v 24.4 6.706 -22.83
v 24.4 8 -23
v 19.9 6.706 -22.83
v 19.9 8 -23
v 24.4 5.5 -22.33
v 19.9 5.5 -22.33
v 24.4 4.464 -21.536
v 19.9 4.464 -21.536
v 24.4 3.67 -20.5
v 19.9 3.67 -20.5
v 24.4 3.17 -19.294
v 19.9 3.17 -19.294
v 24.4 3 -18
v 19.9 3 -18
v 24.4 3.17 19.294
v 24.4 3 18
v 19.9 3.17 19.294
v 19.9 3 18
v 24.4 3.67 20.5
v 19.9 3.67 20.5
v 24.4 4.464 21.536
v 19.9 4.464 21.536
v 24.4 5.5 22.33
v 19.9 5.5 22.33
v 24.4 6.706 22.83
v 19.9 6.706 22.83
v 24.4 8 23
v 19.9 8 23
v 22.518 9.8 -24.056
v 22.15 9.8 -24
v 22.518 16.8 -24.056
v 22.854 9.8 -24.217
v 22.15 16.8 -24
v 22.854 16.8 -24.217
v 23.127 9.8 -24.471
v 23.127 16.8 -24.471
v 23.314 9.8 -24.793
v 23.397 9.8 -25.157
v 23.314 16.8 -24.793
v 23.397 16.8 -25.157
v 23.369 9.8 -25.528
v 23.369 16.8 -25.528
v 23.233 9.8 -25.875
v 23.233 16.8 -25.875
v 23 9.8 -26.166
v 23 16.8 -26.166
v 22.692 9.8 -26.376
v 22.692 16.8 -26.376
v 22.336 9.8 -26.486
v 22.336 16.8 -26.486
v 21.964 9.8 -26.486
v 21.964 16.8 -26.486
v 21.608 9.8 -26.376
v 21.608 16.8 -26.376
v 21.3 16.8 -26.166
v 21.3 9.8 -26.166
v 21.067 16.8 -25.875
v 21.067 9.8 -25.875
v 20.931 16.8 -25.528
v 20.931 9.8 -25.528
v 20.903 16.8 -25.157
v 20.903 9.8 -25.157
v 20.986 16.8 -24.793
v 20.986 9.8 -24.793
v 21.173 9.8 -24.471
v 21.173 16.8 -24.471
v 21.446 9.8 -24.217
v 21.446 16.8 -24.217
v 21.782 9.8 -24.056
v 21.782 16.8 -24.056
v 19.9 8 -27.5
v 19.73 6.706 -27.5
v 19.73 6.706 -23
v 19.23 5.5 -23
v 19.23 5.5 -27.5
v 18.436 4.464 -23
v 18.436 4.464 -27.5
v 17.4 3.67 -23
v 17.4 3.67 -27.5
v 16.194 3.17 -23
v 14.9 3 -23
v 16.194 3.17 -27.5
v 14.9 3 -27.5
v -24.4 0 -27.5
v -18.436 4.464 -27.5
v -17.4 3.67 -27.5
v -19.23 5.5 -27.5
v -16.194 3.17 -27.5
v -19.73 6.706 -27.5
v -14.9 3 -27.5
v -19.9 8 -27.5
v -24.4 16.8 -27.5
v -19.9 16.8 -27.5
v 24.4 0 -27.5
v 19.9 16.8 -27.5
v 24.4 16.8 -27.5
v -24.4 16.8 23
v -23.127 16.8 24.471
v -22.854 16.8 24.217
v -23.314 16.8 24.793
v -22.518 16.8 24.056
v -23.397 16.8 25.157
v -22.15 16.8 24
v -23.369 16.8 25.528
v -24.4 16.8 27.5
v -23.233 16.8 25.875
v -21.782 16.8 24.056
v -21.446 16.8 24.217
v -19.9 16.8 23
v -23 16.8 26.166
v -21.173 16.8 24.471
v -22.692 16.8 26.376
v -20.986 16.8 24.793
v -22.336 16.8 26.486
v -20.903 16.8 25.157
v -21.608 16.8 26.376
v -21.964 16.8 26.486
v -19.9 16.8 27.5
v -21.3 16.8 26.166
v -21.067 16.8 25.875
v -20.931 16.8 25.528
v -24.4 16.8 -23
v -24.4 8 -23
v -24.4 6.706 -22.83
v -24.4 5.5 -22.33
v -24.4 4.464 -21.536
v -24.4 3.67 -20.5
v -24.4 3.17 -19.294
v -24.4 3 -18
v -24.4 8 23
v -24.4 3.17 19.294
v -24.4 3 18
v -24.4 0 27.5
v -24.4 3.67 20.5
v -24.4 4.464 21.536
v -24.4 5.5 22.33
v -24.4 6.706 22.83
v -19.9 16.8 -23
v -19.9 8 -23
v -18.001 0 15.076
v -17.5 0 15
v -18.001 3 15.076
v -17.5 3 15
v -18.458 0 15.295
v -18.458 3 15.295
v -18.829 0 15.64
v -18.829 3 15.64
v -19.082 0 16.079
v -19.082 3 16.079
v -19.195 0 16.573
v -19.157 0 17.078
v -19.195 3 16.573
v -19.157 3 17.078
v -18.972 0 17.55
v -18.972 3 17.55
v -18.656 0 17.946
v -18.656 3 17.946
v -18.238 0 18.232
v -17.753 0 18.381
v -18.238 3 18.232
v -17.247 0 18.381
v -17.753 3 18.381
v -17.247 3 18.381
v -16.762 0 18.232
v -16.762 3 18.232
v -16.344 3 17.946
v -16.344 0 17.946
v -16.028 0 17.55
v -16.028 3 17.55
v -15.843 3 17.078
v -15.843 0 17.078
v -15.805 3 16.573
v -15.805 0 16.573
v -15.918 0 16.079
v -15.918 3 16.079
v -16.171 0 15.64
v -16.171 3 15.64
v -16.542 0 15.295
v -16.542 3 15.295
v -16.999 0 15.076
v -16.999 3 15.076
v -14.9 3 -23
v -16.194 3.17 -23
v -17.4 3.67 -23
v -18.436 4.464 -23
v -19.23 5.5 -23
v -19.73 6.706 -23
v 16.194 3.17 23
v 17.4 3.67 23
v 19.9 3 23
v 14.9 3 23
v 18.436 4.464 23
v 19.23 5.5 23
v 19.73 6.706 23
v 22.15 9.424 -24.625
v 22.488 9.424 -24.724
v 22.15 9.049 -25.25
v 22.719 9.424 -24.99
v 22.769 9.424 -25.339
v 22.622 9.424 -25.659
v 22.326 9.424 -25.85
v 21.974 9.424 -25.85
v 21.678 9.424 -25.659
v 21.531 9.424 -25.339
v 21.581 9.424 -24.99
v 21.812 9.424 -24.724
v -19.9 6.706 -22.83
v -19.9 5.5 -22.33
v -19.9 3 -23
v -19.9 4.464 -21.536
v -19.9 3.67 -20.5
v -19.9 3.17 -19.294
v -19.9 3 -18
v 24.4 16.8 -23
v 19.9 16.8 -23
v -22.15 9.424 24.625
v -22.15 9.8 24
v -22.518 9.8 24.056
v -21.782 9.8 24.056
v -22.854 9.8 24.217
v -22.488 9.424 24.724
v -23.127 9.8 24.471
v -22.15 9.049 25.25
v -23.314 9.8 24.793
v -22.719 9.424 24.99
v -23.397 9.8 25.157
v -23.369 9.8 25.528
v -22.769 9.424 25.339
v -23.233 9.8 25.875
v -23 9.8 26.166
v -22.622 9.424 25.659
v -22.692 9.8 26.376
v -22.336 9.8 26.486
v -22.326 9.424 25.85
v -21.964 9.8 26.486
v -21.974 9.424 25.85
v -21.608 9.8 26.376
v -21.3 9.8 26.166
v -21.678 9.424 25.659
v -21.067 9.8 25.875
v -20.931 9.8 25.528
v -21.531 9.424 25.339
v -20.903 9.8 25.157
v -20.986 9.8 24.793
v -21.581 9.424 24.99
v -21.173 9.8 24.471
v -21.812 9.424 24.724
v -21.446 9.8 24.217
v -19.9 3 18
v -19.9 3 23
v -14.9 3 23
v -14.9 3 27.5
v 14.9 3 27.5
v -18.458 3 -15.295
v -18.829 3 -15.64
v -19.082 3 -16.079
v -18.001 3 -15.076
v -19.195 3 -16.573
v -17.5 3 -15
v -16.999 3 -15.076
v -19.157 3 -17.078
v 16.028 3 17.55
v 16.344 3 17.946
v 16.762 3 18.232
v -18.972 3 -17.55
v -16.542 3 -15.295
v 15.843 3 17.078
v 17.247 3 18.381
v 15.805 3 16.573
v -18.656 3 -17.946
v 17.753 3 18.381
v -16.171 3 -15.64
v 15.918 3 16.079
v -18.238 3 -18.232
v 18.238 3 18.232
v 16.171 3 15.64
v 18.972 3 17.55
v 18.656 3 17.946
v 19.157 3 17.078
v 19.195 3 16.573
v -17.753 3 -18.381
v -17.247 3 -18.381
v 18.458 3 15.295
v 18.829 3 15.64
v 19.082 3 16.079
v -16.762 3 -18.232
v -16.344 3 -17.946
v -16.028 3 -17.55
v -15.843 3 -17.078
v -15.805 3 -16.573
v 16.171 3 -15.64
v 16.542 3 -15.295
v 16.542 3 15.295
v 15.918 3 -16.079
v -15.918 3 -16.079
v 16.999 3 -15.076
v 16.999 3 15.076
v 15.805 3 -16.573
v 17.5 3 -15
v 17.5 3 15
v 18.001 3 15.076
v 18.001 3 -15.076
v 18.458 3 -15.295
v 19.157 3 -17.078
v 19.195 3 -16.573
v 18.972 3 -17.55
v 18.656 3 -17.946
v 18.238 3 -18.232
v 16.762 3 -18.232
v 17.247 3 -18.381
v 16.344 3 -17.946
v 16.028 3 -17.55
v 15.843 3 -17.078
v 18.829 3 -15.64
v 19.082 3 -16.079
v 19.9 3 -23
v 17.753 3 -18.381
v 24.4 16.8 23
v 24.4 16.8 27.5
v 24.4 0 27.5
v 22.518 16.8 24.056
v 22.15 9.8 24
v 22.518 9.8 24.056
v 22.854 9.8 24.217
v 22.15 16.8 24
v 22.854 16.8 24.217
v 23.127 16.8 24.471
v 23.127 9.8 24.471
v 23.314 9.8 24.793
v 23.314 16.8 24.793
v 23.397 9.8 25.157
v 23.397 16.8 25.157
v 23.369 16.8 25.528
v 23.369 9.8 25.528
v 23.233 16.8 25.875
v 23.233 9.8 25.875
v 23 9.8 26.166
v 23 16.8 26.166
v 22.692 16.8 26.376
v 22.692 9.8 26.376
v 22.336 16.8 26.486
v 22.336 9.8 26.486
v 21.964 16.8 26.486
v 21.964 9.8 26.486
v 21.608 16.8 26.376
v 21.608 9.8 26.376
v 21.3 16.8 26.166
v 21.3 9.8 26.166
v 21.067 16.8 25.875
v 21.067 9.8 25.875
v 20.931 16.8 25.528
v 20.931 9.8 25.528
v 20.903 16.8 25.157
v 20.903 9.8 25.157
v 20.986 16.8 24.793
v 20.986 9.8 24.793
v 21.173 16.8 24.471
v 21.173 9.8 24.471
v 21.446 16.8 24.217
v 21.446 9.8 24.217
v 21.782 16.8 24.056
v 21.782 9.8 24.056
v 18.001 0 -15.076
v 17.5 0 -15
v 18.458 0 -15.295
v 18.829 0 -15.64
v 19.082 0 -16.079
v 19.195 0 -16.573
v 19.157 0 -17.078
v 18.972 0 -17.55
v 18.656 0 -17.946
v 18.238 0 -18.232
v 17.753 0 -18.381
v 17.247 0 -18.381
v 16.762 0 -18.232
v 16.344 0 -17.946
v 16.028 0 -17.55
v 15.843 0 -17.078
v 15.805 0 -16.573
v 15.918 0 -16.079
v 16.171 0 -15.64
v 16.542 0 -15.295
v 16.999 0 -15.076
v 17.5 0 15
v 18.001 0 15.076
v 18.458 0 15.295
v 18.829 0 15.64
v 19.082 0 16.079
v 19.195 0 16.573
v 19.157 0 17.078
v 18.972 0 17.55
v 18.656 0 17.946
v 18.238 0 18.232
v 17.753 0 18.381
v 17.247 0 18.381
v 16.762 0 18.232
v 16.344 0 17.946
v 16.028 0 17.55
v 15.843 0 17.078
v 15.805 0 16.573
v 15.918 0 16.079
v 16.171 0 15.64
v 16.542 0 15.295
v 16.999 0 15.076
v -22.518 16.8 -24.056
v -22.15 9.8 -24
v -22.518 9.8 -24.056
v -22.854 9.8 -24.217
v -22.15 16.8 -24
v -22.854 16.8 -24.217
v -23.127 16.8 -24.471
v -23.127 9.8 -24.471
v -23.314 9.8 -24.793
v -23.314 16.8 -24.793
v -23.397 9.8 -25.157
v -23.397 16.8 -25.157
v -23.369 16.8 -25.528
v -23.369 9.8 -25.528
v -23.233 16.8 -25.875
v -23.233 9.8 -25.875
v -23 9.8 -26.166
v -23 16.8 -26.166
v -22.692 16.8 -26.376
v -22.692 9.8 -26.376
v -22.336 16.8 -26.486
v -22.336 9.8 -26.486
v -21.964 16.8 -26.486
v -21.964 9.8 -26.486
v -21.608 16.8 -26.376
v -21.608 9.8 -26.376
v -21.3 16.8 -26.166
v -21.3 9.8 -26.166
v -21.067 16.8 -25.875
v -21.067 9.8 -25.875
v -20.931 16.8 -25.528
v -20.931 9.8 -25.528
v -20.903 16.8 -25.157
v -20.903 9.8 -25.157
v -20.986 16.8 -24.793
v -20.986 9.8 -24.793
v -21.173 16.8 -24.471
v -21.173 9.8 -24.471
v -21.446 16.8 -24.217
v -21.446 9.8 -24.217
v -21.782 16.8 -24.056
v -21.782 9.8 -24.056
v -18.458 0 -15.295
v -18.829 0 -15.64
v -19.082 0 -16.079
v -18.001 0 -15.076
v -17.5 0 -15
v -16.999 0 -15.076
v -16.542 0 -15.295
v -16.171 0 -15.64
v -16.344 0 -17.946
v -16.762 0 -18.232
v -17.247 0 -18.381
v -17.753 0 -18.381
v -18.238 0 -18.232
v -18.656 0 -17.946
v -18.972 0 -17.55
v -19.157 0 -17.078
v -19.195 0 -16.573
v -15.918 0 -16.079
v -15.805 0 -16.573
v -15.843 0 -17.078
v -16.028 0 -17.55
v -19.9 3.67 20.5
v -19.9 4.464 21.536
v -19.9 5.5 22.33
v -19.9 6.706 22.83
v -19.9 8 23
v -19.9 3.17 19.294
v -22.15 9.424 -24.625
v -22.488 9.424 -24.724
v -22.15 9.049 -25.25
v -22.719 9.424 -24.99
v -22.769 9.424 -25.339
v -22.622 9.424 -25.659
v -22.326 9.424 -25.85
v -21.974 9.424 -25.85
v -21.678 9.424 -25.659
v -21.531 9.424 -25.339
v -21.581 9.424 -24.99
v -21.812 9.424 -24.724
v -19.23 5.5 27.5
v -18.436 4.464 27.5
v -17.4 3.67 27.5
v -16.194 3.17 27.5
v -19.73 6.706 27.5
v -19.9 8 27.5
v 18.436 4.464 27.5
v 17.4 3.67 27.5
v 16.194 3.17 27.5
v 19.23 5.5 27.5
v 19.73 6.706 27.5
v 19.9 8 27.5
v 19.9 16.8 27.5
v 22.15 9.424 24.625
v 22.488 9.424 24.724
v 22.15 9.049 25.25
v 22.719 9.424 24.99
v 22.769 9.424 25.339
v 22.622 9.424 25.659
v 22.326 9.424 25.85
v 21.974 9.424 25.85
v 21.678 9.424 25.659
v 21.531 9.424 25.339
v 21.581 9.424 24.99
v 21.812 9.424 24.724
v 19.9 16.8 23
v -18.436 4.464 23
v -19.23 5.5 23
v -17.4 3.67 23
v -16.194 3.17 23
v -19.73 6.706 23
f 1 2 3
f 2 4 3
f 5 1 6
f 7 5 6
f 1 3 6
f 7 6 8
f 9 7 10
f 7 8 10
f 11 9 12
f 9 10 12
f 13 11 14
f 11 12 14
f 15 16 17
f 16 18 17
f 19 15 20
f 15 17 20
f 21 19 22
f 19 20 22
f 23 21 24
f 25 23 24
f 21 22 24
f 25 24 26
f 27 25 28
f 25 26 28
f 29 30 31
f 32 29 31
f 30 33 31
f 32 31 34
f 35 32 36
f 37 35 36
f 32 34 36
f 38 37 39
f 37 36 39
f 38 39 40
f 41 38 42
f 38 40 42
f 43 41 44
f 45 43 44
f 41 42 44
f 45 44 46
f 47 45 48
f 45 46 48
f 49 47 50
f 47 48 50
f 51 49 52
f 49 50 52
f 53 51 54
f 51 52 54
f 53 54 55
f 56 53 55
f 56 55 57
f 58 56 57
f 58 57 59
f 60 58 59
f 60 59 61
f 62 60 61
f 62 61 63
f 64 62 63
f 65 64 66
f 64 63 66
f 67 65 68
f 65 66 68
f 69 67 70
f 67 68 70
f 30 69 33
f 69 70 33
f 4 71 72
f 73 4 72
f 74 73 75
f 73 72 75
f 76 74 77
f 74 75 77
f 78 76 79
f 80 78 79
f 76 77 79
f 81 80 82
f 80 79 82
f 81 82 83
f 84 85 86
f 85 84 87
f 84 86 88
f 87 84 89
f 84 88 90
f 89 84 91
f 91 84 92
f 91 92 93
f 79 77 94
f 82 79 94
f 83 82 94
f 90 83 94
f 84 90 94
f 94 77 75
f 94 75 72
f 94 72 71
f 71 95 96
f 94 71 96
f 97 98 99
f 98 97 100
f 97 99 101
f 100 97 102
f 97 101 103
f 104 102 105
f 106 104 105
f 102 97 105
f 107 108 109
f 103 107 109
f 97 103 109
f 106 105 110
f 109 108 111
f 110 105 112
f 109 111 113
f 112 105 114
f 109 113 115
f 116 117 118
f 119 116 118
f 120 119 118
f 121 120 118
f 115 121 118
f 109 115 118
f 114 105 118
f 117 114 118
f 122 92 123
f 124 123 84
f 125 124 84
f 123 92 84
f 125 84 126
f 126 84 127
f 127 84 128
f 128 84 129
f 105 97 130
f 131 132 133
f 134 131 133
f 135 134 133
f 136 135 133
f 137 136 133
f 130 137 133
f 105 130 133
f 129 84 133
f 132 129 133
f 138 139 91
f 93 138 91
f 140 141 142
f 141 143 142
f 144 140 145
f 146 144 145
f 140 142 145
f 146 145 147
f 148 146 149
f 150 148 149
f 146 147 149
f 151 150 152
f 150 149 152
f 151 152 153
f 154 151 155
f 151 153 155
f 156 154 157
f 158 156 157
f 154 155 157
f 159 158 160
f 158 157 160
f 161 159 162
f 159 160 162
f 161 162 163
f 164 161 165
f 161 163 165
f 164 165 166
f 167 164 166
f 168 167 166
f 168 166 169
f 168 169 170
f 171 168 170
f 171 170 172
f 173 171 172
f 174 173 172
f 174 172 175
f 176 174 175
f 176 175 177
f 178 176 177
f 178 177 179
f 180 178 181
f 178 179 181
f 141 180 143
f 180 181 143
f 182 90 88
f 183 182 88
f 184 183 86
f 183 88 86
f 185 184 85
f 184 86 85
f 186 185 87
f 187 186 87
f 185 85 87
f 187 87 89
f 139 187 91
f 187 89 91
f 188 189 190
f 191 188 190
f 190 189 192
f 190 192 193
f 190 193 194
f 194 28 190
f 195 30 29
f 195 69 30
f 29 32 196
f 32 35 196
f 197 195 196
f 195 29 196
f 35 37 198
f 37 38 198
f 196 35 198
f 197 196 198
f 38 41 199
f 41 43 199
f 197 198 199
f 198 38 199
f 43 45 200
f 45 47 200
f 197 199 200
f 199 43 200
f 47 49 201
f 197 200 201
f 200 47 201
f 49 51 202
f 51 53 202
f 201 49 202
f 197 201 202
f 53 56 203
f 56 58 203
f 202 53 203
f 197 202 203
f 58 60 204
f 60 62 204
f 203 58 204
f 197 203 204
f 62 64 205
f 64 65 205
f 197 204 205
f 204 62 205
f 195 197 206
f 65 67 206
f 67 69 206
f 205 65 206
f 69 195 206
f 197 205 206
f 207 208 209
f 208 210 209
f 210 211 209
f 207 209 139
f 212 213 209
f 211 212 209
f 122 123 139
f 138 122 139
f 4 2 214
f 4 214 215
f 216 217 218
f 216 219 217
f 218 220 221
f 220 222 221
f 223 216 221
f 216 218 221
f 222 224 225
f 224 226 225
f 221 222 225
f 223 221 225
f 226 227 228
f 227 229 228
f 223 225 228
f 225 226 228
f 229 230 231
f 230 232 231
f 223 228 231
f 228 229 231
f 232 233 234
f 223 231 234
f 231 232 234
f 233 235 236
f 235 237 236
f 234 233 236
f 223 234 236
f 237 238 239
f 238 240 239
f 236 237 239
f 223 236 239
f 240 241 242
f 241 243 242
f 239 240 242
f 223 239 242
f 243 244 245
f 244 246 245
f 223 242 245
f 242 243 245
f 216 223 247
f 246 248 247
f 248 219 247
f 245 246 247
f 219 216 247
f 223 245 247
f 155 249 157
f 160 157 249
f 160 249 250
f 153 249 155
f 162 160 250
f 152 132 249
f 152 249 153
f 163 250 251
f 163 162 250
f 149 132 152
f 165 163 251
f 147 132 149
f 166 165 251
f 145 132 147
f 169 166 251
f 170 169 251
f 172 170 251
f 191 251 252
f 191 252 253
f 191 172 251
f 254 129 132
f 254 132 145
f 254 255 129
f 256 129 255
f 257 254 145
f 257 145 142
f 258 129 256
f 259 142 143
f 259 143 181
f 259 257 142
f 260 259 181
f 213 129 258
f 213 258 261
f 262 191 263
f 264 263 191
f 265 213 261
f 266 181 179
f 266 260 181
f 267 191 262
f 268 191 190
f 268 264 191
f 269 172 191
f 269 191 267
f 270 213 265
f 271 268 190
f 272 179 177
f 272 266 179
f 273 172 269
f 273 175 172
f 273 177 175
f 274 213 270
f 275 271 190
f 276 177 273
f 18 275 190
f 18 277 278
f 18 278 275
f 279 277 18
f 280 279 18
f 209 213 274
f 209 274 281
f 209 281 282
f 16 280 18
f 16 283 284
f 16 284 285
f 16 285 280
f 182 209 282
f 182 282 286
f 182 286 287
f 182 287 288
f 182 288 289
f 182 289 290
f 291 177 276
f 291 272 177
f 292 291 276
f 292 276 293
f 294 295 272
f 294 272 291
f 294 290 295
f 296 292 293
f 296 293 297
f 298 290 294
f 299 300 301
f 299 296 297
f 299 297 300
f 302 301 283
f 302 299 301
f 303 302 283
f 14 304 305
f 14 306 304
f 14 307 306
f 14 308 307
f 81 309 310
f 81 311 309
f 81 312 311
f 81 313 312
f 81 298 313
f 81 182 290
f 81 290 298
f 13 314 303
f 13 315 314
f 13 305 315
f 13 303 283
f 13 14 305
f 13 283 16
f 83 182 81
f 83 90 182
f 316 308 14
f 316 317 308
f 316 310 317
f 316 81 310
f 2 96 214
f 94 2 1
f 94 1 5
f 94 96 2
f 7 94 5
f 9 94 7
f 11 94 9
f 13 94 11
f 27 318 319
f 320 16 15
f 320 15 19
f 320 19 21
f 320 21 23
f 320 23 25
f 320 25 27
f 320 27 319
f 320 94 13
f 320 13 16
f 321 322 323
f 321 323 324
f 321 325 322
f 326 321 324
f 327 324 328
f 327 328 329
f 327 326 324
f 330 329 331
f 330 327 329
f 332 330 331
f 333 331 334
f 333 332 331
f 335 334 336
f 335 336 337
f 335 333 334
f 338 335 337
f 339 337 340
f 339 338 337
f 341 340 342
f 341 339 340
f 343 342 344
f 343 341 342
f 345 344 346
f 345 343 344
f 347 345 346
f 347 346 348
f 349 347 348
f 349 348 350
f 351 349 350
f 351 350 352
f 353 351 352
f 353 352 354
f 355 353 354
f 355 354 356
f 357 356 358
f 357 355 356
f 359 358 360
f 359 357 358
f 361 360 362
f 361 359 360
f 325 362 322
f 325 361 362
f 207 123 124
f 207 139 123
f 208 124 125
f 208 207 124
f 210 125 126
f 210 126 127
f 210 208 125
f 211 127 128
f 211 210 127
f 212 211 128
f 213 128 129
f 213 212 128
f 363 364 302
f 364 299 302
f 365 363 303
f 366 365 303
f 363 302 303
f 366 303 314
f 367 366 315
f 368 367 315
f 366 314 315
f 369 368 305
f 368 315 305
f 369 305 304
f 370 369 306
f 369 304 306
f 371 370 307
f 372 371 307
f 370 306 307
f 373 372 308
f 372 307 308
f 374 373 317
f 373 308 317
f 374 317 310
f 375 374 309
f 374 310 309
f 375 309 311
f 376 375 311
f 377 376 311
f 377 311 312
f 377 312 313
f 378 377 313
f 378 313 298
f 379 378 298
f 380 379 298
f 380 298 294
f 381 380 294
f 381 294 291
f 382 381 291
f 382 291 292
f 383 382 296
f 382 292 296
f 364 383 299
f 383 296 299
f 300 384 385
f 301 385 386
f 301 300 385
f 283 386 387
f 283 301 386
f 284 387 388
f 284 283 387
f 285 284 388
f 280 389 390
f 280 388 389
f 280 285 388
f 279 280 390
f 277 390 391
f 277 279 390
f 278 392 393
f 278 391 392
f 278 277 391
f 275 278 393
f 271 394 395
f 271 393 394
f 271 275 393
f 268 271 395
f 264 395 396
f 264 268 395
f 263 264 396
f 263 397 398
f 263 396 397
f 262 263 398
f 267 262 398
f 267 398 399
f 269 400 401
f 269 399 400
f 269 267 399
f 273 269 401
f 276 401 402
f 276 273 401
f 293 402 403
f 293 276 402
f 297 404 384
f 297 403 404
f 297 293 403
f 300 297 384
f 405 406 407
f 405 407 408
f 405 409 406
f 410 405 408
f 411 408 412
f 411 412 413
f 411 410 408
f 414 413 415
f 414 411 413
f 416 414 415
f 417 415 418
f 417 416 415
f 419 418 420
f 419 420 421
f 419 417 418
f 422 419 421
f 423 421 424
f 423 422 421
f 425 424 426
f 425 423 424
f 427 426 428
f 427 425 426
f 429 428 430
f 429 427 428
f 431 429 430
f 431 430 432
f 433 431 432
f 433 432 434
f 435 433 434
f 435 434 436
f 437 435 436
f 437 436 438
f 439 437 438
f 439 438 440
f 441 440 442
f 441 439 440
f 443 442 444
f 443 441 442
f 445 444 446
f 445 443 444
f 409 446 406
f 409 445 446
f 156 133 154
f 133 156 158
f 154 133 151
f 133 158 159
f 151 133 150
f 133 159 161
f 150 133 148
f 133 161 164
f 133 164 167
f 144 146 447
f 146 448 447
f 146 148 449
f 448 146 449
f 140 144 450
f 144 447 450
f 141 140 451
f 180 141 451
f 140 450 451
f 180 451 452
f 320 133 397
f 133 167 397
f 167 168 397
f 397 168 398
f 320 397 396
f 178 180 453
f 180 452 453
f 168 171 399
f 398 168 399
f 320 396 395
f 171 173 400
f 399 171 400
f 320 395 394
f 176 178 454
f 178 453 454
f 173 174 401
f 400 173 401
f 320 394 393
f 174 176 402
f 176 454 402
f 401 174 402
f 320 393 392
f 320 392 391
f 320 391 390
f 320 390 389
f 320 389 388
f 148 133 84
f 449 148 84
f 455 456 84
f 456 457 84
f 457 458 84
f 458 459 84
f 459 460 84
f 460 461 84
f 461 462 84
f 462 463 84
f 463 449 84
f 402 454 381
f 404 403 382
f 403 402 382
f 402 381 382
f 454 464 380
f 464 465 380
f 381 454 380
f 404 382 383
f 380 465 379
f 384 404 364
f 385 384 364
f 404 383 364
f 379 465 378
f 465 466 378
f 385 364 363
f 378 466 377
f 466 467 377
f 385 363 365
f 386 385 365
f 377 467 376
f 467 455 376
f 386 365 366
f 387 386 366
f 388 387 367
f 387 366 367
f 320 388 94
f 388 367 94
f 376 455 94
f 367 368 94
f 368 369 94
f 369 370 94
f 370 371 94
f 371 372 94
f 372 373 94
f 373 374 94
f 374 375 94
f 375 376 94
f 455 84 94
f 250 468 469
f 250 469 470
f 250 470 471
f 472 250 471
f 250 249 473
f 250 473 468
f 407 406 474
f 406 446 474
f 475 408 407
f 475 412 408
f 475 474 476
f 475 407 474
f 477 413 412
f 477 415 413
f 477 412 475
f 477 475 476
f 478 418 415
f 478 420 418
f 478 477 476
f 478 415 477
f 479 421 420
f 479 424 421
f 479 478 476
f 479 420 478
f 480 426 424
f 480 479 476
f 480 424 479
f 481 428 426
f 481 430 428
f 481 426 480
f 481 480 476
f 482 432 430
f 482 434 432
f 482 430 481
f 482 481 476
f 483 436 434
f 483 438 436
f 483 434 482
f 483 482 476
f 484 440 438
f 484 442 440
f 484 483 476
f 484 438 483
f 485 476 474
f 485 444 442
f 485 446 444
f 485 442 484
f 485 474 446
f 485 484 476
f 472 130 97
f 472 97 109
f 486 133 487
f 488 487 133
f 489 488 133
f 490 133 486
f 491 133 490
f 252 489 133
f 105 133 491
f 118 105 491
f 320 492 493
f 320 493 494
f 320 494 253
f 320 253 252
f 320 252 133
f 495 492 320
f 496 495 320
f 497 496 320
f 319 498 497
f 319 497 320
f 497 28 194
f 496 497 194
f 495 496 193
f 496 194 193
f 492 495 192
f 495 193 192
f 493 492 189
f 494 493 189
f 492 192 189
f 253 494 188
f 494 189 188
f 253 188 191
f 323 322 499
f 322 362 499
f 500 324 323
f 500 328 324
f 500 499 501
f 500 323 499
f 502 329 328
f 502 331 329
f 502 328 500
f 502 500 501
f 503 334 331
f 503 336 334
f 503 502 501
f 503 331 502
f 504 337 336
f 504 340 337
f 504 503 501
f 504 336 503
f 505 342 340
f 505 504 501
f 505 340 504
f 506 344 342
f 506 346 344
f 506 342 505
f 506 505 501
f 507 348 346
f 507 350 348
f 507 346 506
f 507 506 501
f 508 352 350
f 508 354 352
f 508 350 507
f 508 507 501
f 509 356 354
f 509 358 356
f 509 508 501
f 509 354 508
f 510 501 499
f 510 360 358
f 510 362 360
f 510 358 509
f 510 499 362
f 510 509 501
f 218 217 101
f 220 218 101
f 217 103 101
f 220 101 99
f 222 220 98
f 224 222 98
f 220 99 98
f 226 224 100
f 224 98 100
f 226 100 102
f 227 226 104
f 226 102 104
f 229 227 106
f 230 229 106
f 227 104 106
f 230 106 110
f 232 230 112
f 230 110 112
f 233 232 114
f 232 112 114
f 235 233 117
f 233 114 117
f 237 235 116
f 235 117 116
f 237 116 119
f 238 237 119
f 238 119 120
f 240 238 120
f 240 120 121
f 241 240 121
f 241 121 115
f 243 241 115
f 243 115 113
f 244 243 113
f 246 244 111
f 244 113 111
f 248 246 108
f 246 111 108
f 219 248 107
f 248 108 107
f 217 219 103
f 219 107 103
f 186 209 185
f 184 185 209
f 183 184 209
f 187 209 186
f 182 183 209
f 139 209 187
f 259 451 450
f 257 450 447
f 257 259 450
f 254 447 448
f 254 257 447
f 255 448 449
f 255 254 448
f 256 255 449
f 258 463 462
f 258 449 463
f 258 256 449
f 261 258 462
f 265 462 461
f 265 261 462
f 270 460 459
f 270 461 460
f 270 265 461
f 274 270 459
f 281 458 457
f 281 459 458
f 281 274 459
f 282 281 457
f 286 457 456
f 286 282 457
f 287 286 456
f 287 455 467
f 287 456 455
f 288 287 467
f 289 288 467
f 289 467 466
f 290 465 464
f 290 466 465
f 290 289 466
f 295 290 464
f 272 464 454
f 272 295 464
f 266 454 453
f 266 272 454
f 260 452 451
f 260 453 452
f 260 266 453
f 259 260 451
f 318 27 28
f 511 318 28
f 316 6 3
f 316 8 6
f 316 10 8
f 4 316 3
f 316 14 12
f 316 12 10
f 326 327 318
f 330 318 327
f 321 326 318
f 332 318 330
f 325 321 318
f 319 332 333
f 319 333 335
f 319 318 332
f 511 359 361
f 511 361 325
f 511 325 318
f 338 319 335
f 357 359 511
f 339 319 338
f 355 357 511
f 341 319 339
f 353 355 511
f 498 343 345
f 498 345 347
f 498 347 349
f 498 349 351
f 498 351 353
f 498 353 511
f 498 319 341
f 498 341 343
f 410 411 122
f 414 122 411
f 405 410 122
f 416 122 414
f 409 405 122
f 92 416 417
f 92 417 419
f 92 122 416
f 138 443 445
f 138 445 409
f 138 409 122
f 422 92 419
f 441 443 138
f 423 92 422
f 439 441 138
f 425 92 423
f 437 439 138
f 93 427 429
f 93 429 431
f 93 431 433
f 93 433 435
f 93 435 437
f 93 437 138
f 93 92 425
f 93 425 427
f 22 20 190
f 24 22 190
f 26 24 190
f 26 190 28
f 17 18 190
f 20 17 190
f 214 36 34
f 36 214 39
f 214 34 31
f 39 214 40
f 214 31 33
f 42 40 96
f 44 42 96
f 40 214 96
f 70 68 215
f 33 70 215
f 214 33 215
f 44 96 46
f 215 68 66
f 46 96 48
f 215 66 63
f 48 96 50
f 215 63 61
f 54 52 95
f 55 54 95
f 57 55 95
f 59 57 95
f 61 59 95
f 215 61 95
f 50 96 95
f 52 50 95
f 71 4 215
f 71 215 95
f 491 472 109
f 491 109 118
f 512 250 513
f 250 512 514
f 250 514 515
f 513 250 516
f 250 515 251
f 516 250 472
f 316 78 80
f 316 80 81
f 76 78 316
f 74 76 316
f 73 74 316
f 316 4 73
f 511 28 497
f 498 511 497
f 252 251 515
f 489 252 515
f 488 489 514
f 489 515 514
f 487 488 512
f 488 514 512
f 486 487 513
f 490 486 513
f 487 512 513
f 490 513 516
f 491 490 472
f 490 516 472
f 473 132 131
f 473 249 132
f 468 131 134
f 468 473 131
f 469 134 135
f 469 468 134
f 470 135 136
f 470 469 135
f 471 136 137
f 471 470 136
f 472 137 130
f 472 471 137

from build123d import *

# Parameters (mm, degrees)
SKETCH1_W               = 48.8
SKETCH1_H               = 55
BOSS_EXTRUDE1_DEPTH     = 3
SKETCH2_W               = 4.5
SKETCH2_H               = 4.5
BOSS_EXTRUDE2_DEPTH     = 13.8
FILLET1_R               = 5
FILLET2_START           = -27.5
FILLET2_DEPTH           = 4.5
MIRROR4_COPY_1_SKETCH_W = 4.5
MIRROR4_COPY_1_SKETCH_H = 4.5
MIRROR4_COPY_1_DEPTH    = 13.8
FILLET3_R               = 5
FILLET4_START           = -27.5
FILLET4_DEPTH           = 4.5
FILLET5_R               = 5
FILLET6_START           = 23
FILLET6_DEPTH           = 4.5
FILLET7_R               = 5
FILLET8_START           = 23
FILLET8_DEPTH           = 4.5


with BuildPart() as part:
    # Sketch1 → Boss-Extrude1 (new body)
    with BuildSketch(Plane(origin=(0, 0, 0), x_dir=(1, 0, 0), z_dir=(0, 1, 0))):
        Rectangle(SKETCH1_W, SKETCH1_H)
    extrude(amount=BOSS_EXTRUDE1_DEPTH)

    # Sketch2 → Boss-Extrude2 (add)
    with BuildSketch(Plane(origin=(0, 3, 0), x_dir=(1, 0, 0), z_dir=(0, 1, 0))):
        with Locations((-22.15, 25.25)):
            Rectangle(SKETCH2_W, SKETCH2_H)
    boss_extrude2 = extrude(amount=BOSS_EXTRUDE2_DEPTH)

    # Sketch11 → M3x0.5 Tapped Hole1 (revolve, cut)
    with BuildSketch(Plane(origin=(-22.15, 16.8, -25.25), x_dir=(0, 0, 1), z_dir=(1, 0, 0))):
        Polygon((0, 0), (0, 7.751075774), (1.25, 7), (1.25, 0), align=None)
    m3x0_5_tapped_hole1 = revolve(axis=Axis((-22.15, 23.15, -25.25), (0, -1, 0)), mode=Mode.SUBTRACT)

    # Sketch13 → M3 Clearance Hole1 (revolve, cut)
    with BuildSketch(Plane(origin=(-17.5, 3, -16.7), x_dir=(0, 0, 1), z_dir=(1, 0, 0))):
        Polygon((0, 0), (0, 9.521463052), (1.7, 8.5), (1.7, 0), align=None)
    m3_clearance_hole1 = revolve(axis=Axis((-17.5, 9.35, -16.7), (0, -1, 0)), mode=Mode.SUBTRACT)

    # Fillet1
    fillet1_edges = [part.edges().sort_by_distance(p)[0] for p in [
        (-22.15, 3, -23),
    ]]
    fillet(fillet1_edges, radius=FILLET1_R)

    # Fillet2: read off the stored shape, not the designer's step
    # Fillet2 outline → Fillet2 (add)
    with BuildSketch(Plane.XY.offset(FILLET2_START)):
        with BuildLine():
            ThreePointArc((-14.9, 3), (-18.435533906, 4.464466094), (-19.9, 8))
            Line((-19.9, 8), (-19.9, 3))
            Line((-19.9, 3), (-14.9, 3))
        make_face()
    extrude(amount=FILLET2_DEPTH)

    # Mirror3: Boss-Extrude2, M3x0.5 Tapped Hole1, M3 Clearance Hole1 across plane
    add(boss_extrude2.mirror(Plane(origin=(0, 0, 0), x_dir=(0, 0, 1), z_dir=(1, 0, 0))))
    add(m3x0_5_tapped_hole1.mirror(Plane(origin=(0, 0, 0), x_dir=(0, 0, 1), z_dir=(1, 0, 0))), mode=Mode.SUBTRACT)
    add(m3_clearance_hole1.mirror(Plane(origin=(0, 0, 0), x_dir=(0, 0, 1), z_dir=(1, 0, 0))), mode=Mode.SUBTRACT)

    # Mirror4: Boss-Extrude2, M3x0.5 Tapped Hole1, M3 Clearance Hole1 across plane
    add(boss_extrude2.mirror(Plane.XY))
    add(m3x0_5_tapped_hole1.mirror(Plane.XY), mode=Mode.SUBTRACT)
    add(m3_clearance_hole1.mirror(Plane.XY), mode=Mode.SUBTRACT)

    # Mirror4 copy 1 sketch → Mirror4 copy 1 (add)
    with BuildSketch(Plane(origin=(0, 3, 0), x_dir=(-1, 0, 0), z_dir=(0, 1, 0))):
        with Locations((-22.15, 25.25)):
            Rectangle(MIRROR4_COPY_1_SKETCH_W, MIRROR4_COPY_1_SKETCH_H)
    extrude(amount=MIRROR4_COPY_1_DEPTH)

    # Mirror4 copy 2 sketch → Mirror4 copy 2 (revolve, cut)
    with BuildSketch(Plane(origin=(22.15, 16.8, 25.25), x_dir=(0, 0, -1), z_dir=(-1, 0, 0))):
        Polygon((0, 0), (0, 7.751075774), (1.25, 7), (1.25, 0), align=None)
    revolve(axis=Axis((22.15, 23.15, 25.25), (0, -1, 0)), mode=Mode.SUBTRACT)

    # Mirror4 copy 3 sketch → Mirror4 copy 3 (revolve, cut)
    with BuildSketch(Plane(origin=(17.5, 3, 16.7), x_dir=(0, 0, -1), z_dir=(-1, 0, 0))):
        Polygon((0, 0), (0, 9.521463052), (1.7, 8.5), (1.7, 0), align=None)
    revolve(axis=Axis((17.5, 9.35, 16.7), (0, -1, 0)), mode=Mode.SUBTRACT)

    # Fillet3
    fillet3_edges = [part.edges().sort_by_distance(p)[0] for p in [
        (22.15, 3, -23),
    ]]
    fillet(fillet3_edges, radius=FILLET3_R)

    # Fillet4: read off the stored shape, not the designer's step
    # Fillet4 outline → Fillet4 (add)
    with BuildSketch(Plane.XY.offset(FILLET4_START)):
        with BuildLine():
            Line((19.9, 3), (19.9, 8))
            ThreePointArc((19.9, 8), (18.435533906, 4.464466094), (14.9, 3))
            Line((14.9, 3), (19.9, 3))
        make_face()
    extrude(amount=FILLET4_DEPTH)

    # Fillet5
    fillet5_edges = [part.edges().sort_by_distance(p)[0] for p in [
        (22.15, 3, 23),
    ]]
    fillet(fillet5_edges, radius=FILLET5_R)

    # Fillet6: read off the stored shape, not the designer's step
    # Fillet6 outline → Fillet6 (add)
    with BuildSketch(Plane.XY.offset(FILLET6_START)):
        with BuildLine():
            Line((19.9, 3), (19.9, 8))
            ThreePointArc((19.9, 8), (18.435533906, 4.464466094), (14.9, 3))
            Line((14.9, 3), (19.9, 3))
        make_face()
    extrude(amount=FILLET6_DEPTH)

    # Fillet7
    fillet7_edges = [part.edges().sort_by_distance(p)[0] for p in [
        (-22.15, 3, 23),
    ]]
    fillet(fillet7_edges, radius=FILLET7_R)

    # Fillet8: read off the stored shape, not the designer's step
    # Fillet8 outline → Fillet8 (add)
    with BuildSketch(Plane.XY.offset(FILLET8_START)):
        with BuildLine():
            ThreePointArc((-14.9, 3), (-18.435533906, 4.464466094), (-19.9, 8))
            Line((-19.9, 8), (-19.9, 3))
            Line((-19.9, 3), (-14.9, 3))
        make_face()
    extrude(amount=FILLET8_DEPTH)


solid = part.part
